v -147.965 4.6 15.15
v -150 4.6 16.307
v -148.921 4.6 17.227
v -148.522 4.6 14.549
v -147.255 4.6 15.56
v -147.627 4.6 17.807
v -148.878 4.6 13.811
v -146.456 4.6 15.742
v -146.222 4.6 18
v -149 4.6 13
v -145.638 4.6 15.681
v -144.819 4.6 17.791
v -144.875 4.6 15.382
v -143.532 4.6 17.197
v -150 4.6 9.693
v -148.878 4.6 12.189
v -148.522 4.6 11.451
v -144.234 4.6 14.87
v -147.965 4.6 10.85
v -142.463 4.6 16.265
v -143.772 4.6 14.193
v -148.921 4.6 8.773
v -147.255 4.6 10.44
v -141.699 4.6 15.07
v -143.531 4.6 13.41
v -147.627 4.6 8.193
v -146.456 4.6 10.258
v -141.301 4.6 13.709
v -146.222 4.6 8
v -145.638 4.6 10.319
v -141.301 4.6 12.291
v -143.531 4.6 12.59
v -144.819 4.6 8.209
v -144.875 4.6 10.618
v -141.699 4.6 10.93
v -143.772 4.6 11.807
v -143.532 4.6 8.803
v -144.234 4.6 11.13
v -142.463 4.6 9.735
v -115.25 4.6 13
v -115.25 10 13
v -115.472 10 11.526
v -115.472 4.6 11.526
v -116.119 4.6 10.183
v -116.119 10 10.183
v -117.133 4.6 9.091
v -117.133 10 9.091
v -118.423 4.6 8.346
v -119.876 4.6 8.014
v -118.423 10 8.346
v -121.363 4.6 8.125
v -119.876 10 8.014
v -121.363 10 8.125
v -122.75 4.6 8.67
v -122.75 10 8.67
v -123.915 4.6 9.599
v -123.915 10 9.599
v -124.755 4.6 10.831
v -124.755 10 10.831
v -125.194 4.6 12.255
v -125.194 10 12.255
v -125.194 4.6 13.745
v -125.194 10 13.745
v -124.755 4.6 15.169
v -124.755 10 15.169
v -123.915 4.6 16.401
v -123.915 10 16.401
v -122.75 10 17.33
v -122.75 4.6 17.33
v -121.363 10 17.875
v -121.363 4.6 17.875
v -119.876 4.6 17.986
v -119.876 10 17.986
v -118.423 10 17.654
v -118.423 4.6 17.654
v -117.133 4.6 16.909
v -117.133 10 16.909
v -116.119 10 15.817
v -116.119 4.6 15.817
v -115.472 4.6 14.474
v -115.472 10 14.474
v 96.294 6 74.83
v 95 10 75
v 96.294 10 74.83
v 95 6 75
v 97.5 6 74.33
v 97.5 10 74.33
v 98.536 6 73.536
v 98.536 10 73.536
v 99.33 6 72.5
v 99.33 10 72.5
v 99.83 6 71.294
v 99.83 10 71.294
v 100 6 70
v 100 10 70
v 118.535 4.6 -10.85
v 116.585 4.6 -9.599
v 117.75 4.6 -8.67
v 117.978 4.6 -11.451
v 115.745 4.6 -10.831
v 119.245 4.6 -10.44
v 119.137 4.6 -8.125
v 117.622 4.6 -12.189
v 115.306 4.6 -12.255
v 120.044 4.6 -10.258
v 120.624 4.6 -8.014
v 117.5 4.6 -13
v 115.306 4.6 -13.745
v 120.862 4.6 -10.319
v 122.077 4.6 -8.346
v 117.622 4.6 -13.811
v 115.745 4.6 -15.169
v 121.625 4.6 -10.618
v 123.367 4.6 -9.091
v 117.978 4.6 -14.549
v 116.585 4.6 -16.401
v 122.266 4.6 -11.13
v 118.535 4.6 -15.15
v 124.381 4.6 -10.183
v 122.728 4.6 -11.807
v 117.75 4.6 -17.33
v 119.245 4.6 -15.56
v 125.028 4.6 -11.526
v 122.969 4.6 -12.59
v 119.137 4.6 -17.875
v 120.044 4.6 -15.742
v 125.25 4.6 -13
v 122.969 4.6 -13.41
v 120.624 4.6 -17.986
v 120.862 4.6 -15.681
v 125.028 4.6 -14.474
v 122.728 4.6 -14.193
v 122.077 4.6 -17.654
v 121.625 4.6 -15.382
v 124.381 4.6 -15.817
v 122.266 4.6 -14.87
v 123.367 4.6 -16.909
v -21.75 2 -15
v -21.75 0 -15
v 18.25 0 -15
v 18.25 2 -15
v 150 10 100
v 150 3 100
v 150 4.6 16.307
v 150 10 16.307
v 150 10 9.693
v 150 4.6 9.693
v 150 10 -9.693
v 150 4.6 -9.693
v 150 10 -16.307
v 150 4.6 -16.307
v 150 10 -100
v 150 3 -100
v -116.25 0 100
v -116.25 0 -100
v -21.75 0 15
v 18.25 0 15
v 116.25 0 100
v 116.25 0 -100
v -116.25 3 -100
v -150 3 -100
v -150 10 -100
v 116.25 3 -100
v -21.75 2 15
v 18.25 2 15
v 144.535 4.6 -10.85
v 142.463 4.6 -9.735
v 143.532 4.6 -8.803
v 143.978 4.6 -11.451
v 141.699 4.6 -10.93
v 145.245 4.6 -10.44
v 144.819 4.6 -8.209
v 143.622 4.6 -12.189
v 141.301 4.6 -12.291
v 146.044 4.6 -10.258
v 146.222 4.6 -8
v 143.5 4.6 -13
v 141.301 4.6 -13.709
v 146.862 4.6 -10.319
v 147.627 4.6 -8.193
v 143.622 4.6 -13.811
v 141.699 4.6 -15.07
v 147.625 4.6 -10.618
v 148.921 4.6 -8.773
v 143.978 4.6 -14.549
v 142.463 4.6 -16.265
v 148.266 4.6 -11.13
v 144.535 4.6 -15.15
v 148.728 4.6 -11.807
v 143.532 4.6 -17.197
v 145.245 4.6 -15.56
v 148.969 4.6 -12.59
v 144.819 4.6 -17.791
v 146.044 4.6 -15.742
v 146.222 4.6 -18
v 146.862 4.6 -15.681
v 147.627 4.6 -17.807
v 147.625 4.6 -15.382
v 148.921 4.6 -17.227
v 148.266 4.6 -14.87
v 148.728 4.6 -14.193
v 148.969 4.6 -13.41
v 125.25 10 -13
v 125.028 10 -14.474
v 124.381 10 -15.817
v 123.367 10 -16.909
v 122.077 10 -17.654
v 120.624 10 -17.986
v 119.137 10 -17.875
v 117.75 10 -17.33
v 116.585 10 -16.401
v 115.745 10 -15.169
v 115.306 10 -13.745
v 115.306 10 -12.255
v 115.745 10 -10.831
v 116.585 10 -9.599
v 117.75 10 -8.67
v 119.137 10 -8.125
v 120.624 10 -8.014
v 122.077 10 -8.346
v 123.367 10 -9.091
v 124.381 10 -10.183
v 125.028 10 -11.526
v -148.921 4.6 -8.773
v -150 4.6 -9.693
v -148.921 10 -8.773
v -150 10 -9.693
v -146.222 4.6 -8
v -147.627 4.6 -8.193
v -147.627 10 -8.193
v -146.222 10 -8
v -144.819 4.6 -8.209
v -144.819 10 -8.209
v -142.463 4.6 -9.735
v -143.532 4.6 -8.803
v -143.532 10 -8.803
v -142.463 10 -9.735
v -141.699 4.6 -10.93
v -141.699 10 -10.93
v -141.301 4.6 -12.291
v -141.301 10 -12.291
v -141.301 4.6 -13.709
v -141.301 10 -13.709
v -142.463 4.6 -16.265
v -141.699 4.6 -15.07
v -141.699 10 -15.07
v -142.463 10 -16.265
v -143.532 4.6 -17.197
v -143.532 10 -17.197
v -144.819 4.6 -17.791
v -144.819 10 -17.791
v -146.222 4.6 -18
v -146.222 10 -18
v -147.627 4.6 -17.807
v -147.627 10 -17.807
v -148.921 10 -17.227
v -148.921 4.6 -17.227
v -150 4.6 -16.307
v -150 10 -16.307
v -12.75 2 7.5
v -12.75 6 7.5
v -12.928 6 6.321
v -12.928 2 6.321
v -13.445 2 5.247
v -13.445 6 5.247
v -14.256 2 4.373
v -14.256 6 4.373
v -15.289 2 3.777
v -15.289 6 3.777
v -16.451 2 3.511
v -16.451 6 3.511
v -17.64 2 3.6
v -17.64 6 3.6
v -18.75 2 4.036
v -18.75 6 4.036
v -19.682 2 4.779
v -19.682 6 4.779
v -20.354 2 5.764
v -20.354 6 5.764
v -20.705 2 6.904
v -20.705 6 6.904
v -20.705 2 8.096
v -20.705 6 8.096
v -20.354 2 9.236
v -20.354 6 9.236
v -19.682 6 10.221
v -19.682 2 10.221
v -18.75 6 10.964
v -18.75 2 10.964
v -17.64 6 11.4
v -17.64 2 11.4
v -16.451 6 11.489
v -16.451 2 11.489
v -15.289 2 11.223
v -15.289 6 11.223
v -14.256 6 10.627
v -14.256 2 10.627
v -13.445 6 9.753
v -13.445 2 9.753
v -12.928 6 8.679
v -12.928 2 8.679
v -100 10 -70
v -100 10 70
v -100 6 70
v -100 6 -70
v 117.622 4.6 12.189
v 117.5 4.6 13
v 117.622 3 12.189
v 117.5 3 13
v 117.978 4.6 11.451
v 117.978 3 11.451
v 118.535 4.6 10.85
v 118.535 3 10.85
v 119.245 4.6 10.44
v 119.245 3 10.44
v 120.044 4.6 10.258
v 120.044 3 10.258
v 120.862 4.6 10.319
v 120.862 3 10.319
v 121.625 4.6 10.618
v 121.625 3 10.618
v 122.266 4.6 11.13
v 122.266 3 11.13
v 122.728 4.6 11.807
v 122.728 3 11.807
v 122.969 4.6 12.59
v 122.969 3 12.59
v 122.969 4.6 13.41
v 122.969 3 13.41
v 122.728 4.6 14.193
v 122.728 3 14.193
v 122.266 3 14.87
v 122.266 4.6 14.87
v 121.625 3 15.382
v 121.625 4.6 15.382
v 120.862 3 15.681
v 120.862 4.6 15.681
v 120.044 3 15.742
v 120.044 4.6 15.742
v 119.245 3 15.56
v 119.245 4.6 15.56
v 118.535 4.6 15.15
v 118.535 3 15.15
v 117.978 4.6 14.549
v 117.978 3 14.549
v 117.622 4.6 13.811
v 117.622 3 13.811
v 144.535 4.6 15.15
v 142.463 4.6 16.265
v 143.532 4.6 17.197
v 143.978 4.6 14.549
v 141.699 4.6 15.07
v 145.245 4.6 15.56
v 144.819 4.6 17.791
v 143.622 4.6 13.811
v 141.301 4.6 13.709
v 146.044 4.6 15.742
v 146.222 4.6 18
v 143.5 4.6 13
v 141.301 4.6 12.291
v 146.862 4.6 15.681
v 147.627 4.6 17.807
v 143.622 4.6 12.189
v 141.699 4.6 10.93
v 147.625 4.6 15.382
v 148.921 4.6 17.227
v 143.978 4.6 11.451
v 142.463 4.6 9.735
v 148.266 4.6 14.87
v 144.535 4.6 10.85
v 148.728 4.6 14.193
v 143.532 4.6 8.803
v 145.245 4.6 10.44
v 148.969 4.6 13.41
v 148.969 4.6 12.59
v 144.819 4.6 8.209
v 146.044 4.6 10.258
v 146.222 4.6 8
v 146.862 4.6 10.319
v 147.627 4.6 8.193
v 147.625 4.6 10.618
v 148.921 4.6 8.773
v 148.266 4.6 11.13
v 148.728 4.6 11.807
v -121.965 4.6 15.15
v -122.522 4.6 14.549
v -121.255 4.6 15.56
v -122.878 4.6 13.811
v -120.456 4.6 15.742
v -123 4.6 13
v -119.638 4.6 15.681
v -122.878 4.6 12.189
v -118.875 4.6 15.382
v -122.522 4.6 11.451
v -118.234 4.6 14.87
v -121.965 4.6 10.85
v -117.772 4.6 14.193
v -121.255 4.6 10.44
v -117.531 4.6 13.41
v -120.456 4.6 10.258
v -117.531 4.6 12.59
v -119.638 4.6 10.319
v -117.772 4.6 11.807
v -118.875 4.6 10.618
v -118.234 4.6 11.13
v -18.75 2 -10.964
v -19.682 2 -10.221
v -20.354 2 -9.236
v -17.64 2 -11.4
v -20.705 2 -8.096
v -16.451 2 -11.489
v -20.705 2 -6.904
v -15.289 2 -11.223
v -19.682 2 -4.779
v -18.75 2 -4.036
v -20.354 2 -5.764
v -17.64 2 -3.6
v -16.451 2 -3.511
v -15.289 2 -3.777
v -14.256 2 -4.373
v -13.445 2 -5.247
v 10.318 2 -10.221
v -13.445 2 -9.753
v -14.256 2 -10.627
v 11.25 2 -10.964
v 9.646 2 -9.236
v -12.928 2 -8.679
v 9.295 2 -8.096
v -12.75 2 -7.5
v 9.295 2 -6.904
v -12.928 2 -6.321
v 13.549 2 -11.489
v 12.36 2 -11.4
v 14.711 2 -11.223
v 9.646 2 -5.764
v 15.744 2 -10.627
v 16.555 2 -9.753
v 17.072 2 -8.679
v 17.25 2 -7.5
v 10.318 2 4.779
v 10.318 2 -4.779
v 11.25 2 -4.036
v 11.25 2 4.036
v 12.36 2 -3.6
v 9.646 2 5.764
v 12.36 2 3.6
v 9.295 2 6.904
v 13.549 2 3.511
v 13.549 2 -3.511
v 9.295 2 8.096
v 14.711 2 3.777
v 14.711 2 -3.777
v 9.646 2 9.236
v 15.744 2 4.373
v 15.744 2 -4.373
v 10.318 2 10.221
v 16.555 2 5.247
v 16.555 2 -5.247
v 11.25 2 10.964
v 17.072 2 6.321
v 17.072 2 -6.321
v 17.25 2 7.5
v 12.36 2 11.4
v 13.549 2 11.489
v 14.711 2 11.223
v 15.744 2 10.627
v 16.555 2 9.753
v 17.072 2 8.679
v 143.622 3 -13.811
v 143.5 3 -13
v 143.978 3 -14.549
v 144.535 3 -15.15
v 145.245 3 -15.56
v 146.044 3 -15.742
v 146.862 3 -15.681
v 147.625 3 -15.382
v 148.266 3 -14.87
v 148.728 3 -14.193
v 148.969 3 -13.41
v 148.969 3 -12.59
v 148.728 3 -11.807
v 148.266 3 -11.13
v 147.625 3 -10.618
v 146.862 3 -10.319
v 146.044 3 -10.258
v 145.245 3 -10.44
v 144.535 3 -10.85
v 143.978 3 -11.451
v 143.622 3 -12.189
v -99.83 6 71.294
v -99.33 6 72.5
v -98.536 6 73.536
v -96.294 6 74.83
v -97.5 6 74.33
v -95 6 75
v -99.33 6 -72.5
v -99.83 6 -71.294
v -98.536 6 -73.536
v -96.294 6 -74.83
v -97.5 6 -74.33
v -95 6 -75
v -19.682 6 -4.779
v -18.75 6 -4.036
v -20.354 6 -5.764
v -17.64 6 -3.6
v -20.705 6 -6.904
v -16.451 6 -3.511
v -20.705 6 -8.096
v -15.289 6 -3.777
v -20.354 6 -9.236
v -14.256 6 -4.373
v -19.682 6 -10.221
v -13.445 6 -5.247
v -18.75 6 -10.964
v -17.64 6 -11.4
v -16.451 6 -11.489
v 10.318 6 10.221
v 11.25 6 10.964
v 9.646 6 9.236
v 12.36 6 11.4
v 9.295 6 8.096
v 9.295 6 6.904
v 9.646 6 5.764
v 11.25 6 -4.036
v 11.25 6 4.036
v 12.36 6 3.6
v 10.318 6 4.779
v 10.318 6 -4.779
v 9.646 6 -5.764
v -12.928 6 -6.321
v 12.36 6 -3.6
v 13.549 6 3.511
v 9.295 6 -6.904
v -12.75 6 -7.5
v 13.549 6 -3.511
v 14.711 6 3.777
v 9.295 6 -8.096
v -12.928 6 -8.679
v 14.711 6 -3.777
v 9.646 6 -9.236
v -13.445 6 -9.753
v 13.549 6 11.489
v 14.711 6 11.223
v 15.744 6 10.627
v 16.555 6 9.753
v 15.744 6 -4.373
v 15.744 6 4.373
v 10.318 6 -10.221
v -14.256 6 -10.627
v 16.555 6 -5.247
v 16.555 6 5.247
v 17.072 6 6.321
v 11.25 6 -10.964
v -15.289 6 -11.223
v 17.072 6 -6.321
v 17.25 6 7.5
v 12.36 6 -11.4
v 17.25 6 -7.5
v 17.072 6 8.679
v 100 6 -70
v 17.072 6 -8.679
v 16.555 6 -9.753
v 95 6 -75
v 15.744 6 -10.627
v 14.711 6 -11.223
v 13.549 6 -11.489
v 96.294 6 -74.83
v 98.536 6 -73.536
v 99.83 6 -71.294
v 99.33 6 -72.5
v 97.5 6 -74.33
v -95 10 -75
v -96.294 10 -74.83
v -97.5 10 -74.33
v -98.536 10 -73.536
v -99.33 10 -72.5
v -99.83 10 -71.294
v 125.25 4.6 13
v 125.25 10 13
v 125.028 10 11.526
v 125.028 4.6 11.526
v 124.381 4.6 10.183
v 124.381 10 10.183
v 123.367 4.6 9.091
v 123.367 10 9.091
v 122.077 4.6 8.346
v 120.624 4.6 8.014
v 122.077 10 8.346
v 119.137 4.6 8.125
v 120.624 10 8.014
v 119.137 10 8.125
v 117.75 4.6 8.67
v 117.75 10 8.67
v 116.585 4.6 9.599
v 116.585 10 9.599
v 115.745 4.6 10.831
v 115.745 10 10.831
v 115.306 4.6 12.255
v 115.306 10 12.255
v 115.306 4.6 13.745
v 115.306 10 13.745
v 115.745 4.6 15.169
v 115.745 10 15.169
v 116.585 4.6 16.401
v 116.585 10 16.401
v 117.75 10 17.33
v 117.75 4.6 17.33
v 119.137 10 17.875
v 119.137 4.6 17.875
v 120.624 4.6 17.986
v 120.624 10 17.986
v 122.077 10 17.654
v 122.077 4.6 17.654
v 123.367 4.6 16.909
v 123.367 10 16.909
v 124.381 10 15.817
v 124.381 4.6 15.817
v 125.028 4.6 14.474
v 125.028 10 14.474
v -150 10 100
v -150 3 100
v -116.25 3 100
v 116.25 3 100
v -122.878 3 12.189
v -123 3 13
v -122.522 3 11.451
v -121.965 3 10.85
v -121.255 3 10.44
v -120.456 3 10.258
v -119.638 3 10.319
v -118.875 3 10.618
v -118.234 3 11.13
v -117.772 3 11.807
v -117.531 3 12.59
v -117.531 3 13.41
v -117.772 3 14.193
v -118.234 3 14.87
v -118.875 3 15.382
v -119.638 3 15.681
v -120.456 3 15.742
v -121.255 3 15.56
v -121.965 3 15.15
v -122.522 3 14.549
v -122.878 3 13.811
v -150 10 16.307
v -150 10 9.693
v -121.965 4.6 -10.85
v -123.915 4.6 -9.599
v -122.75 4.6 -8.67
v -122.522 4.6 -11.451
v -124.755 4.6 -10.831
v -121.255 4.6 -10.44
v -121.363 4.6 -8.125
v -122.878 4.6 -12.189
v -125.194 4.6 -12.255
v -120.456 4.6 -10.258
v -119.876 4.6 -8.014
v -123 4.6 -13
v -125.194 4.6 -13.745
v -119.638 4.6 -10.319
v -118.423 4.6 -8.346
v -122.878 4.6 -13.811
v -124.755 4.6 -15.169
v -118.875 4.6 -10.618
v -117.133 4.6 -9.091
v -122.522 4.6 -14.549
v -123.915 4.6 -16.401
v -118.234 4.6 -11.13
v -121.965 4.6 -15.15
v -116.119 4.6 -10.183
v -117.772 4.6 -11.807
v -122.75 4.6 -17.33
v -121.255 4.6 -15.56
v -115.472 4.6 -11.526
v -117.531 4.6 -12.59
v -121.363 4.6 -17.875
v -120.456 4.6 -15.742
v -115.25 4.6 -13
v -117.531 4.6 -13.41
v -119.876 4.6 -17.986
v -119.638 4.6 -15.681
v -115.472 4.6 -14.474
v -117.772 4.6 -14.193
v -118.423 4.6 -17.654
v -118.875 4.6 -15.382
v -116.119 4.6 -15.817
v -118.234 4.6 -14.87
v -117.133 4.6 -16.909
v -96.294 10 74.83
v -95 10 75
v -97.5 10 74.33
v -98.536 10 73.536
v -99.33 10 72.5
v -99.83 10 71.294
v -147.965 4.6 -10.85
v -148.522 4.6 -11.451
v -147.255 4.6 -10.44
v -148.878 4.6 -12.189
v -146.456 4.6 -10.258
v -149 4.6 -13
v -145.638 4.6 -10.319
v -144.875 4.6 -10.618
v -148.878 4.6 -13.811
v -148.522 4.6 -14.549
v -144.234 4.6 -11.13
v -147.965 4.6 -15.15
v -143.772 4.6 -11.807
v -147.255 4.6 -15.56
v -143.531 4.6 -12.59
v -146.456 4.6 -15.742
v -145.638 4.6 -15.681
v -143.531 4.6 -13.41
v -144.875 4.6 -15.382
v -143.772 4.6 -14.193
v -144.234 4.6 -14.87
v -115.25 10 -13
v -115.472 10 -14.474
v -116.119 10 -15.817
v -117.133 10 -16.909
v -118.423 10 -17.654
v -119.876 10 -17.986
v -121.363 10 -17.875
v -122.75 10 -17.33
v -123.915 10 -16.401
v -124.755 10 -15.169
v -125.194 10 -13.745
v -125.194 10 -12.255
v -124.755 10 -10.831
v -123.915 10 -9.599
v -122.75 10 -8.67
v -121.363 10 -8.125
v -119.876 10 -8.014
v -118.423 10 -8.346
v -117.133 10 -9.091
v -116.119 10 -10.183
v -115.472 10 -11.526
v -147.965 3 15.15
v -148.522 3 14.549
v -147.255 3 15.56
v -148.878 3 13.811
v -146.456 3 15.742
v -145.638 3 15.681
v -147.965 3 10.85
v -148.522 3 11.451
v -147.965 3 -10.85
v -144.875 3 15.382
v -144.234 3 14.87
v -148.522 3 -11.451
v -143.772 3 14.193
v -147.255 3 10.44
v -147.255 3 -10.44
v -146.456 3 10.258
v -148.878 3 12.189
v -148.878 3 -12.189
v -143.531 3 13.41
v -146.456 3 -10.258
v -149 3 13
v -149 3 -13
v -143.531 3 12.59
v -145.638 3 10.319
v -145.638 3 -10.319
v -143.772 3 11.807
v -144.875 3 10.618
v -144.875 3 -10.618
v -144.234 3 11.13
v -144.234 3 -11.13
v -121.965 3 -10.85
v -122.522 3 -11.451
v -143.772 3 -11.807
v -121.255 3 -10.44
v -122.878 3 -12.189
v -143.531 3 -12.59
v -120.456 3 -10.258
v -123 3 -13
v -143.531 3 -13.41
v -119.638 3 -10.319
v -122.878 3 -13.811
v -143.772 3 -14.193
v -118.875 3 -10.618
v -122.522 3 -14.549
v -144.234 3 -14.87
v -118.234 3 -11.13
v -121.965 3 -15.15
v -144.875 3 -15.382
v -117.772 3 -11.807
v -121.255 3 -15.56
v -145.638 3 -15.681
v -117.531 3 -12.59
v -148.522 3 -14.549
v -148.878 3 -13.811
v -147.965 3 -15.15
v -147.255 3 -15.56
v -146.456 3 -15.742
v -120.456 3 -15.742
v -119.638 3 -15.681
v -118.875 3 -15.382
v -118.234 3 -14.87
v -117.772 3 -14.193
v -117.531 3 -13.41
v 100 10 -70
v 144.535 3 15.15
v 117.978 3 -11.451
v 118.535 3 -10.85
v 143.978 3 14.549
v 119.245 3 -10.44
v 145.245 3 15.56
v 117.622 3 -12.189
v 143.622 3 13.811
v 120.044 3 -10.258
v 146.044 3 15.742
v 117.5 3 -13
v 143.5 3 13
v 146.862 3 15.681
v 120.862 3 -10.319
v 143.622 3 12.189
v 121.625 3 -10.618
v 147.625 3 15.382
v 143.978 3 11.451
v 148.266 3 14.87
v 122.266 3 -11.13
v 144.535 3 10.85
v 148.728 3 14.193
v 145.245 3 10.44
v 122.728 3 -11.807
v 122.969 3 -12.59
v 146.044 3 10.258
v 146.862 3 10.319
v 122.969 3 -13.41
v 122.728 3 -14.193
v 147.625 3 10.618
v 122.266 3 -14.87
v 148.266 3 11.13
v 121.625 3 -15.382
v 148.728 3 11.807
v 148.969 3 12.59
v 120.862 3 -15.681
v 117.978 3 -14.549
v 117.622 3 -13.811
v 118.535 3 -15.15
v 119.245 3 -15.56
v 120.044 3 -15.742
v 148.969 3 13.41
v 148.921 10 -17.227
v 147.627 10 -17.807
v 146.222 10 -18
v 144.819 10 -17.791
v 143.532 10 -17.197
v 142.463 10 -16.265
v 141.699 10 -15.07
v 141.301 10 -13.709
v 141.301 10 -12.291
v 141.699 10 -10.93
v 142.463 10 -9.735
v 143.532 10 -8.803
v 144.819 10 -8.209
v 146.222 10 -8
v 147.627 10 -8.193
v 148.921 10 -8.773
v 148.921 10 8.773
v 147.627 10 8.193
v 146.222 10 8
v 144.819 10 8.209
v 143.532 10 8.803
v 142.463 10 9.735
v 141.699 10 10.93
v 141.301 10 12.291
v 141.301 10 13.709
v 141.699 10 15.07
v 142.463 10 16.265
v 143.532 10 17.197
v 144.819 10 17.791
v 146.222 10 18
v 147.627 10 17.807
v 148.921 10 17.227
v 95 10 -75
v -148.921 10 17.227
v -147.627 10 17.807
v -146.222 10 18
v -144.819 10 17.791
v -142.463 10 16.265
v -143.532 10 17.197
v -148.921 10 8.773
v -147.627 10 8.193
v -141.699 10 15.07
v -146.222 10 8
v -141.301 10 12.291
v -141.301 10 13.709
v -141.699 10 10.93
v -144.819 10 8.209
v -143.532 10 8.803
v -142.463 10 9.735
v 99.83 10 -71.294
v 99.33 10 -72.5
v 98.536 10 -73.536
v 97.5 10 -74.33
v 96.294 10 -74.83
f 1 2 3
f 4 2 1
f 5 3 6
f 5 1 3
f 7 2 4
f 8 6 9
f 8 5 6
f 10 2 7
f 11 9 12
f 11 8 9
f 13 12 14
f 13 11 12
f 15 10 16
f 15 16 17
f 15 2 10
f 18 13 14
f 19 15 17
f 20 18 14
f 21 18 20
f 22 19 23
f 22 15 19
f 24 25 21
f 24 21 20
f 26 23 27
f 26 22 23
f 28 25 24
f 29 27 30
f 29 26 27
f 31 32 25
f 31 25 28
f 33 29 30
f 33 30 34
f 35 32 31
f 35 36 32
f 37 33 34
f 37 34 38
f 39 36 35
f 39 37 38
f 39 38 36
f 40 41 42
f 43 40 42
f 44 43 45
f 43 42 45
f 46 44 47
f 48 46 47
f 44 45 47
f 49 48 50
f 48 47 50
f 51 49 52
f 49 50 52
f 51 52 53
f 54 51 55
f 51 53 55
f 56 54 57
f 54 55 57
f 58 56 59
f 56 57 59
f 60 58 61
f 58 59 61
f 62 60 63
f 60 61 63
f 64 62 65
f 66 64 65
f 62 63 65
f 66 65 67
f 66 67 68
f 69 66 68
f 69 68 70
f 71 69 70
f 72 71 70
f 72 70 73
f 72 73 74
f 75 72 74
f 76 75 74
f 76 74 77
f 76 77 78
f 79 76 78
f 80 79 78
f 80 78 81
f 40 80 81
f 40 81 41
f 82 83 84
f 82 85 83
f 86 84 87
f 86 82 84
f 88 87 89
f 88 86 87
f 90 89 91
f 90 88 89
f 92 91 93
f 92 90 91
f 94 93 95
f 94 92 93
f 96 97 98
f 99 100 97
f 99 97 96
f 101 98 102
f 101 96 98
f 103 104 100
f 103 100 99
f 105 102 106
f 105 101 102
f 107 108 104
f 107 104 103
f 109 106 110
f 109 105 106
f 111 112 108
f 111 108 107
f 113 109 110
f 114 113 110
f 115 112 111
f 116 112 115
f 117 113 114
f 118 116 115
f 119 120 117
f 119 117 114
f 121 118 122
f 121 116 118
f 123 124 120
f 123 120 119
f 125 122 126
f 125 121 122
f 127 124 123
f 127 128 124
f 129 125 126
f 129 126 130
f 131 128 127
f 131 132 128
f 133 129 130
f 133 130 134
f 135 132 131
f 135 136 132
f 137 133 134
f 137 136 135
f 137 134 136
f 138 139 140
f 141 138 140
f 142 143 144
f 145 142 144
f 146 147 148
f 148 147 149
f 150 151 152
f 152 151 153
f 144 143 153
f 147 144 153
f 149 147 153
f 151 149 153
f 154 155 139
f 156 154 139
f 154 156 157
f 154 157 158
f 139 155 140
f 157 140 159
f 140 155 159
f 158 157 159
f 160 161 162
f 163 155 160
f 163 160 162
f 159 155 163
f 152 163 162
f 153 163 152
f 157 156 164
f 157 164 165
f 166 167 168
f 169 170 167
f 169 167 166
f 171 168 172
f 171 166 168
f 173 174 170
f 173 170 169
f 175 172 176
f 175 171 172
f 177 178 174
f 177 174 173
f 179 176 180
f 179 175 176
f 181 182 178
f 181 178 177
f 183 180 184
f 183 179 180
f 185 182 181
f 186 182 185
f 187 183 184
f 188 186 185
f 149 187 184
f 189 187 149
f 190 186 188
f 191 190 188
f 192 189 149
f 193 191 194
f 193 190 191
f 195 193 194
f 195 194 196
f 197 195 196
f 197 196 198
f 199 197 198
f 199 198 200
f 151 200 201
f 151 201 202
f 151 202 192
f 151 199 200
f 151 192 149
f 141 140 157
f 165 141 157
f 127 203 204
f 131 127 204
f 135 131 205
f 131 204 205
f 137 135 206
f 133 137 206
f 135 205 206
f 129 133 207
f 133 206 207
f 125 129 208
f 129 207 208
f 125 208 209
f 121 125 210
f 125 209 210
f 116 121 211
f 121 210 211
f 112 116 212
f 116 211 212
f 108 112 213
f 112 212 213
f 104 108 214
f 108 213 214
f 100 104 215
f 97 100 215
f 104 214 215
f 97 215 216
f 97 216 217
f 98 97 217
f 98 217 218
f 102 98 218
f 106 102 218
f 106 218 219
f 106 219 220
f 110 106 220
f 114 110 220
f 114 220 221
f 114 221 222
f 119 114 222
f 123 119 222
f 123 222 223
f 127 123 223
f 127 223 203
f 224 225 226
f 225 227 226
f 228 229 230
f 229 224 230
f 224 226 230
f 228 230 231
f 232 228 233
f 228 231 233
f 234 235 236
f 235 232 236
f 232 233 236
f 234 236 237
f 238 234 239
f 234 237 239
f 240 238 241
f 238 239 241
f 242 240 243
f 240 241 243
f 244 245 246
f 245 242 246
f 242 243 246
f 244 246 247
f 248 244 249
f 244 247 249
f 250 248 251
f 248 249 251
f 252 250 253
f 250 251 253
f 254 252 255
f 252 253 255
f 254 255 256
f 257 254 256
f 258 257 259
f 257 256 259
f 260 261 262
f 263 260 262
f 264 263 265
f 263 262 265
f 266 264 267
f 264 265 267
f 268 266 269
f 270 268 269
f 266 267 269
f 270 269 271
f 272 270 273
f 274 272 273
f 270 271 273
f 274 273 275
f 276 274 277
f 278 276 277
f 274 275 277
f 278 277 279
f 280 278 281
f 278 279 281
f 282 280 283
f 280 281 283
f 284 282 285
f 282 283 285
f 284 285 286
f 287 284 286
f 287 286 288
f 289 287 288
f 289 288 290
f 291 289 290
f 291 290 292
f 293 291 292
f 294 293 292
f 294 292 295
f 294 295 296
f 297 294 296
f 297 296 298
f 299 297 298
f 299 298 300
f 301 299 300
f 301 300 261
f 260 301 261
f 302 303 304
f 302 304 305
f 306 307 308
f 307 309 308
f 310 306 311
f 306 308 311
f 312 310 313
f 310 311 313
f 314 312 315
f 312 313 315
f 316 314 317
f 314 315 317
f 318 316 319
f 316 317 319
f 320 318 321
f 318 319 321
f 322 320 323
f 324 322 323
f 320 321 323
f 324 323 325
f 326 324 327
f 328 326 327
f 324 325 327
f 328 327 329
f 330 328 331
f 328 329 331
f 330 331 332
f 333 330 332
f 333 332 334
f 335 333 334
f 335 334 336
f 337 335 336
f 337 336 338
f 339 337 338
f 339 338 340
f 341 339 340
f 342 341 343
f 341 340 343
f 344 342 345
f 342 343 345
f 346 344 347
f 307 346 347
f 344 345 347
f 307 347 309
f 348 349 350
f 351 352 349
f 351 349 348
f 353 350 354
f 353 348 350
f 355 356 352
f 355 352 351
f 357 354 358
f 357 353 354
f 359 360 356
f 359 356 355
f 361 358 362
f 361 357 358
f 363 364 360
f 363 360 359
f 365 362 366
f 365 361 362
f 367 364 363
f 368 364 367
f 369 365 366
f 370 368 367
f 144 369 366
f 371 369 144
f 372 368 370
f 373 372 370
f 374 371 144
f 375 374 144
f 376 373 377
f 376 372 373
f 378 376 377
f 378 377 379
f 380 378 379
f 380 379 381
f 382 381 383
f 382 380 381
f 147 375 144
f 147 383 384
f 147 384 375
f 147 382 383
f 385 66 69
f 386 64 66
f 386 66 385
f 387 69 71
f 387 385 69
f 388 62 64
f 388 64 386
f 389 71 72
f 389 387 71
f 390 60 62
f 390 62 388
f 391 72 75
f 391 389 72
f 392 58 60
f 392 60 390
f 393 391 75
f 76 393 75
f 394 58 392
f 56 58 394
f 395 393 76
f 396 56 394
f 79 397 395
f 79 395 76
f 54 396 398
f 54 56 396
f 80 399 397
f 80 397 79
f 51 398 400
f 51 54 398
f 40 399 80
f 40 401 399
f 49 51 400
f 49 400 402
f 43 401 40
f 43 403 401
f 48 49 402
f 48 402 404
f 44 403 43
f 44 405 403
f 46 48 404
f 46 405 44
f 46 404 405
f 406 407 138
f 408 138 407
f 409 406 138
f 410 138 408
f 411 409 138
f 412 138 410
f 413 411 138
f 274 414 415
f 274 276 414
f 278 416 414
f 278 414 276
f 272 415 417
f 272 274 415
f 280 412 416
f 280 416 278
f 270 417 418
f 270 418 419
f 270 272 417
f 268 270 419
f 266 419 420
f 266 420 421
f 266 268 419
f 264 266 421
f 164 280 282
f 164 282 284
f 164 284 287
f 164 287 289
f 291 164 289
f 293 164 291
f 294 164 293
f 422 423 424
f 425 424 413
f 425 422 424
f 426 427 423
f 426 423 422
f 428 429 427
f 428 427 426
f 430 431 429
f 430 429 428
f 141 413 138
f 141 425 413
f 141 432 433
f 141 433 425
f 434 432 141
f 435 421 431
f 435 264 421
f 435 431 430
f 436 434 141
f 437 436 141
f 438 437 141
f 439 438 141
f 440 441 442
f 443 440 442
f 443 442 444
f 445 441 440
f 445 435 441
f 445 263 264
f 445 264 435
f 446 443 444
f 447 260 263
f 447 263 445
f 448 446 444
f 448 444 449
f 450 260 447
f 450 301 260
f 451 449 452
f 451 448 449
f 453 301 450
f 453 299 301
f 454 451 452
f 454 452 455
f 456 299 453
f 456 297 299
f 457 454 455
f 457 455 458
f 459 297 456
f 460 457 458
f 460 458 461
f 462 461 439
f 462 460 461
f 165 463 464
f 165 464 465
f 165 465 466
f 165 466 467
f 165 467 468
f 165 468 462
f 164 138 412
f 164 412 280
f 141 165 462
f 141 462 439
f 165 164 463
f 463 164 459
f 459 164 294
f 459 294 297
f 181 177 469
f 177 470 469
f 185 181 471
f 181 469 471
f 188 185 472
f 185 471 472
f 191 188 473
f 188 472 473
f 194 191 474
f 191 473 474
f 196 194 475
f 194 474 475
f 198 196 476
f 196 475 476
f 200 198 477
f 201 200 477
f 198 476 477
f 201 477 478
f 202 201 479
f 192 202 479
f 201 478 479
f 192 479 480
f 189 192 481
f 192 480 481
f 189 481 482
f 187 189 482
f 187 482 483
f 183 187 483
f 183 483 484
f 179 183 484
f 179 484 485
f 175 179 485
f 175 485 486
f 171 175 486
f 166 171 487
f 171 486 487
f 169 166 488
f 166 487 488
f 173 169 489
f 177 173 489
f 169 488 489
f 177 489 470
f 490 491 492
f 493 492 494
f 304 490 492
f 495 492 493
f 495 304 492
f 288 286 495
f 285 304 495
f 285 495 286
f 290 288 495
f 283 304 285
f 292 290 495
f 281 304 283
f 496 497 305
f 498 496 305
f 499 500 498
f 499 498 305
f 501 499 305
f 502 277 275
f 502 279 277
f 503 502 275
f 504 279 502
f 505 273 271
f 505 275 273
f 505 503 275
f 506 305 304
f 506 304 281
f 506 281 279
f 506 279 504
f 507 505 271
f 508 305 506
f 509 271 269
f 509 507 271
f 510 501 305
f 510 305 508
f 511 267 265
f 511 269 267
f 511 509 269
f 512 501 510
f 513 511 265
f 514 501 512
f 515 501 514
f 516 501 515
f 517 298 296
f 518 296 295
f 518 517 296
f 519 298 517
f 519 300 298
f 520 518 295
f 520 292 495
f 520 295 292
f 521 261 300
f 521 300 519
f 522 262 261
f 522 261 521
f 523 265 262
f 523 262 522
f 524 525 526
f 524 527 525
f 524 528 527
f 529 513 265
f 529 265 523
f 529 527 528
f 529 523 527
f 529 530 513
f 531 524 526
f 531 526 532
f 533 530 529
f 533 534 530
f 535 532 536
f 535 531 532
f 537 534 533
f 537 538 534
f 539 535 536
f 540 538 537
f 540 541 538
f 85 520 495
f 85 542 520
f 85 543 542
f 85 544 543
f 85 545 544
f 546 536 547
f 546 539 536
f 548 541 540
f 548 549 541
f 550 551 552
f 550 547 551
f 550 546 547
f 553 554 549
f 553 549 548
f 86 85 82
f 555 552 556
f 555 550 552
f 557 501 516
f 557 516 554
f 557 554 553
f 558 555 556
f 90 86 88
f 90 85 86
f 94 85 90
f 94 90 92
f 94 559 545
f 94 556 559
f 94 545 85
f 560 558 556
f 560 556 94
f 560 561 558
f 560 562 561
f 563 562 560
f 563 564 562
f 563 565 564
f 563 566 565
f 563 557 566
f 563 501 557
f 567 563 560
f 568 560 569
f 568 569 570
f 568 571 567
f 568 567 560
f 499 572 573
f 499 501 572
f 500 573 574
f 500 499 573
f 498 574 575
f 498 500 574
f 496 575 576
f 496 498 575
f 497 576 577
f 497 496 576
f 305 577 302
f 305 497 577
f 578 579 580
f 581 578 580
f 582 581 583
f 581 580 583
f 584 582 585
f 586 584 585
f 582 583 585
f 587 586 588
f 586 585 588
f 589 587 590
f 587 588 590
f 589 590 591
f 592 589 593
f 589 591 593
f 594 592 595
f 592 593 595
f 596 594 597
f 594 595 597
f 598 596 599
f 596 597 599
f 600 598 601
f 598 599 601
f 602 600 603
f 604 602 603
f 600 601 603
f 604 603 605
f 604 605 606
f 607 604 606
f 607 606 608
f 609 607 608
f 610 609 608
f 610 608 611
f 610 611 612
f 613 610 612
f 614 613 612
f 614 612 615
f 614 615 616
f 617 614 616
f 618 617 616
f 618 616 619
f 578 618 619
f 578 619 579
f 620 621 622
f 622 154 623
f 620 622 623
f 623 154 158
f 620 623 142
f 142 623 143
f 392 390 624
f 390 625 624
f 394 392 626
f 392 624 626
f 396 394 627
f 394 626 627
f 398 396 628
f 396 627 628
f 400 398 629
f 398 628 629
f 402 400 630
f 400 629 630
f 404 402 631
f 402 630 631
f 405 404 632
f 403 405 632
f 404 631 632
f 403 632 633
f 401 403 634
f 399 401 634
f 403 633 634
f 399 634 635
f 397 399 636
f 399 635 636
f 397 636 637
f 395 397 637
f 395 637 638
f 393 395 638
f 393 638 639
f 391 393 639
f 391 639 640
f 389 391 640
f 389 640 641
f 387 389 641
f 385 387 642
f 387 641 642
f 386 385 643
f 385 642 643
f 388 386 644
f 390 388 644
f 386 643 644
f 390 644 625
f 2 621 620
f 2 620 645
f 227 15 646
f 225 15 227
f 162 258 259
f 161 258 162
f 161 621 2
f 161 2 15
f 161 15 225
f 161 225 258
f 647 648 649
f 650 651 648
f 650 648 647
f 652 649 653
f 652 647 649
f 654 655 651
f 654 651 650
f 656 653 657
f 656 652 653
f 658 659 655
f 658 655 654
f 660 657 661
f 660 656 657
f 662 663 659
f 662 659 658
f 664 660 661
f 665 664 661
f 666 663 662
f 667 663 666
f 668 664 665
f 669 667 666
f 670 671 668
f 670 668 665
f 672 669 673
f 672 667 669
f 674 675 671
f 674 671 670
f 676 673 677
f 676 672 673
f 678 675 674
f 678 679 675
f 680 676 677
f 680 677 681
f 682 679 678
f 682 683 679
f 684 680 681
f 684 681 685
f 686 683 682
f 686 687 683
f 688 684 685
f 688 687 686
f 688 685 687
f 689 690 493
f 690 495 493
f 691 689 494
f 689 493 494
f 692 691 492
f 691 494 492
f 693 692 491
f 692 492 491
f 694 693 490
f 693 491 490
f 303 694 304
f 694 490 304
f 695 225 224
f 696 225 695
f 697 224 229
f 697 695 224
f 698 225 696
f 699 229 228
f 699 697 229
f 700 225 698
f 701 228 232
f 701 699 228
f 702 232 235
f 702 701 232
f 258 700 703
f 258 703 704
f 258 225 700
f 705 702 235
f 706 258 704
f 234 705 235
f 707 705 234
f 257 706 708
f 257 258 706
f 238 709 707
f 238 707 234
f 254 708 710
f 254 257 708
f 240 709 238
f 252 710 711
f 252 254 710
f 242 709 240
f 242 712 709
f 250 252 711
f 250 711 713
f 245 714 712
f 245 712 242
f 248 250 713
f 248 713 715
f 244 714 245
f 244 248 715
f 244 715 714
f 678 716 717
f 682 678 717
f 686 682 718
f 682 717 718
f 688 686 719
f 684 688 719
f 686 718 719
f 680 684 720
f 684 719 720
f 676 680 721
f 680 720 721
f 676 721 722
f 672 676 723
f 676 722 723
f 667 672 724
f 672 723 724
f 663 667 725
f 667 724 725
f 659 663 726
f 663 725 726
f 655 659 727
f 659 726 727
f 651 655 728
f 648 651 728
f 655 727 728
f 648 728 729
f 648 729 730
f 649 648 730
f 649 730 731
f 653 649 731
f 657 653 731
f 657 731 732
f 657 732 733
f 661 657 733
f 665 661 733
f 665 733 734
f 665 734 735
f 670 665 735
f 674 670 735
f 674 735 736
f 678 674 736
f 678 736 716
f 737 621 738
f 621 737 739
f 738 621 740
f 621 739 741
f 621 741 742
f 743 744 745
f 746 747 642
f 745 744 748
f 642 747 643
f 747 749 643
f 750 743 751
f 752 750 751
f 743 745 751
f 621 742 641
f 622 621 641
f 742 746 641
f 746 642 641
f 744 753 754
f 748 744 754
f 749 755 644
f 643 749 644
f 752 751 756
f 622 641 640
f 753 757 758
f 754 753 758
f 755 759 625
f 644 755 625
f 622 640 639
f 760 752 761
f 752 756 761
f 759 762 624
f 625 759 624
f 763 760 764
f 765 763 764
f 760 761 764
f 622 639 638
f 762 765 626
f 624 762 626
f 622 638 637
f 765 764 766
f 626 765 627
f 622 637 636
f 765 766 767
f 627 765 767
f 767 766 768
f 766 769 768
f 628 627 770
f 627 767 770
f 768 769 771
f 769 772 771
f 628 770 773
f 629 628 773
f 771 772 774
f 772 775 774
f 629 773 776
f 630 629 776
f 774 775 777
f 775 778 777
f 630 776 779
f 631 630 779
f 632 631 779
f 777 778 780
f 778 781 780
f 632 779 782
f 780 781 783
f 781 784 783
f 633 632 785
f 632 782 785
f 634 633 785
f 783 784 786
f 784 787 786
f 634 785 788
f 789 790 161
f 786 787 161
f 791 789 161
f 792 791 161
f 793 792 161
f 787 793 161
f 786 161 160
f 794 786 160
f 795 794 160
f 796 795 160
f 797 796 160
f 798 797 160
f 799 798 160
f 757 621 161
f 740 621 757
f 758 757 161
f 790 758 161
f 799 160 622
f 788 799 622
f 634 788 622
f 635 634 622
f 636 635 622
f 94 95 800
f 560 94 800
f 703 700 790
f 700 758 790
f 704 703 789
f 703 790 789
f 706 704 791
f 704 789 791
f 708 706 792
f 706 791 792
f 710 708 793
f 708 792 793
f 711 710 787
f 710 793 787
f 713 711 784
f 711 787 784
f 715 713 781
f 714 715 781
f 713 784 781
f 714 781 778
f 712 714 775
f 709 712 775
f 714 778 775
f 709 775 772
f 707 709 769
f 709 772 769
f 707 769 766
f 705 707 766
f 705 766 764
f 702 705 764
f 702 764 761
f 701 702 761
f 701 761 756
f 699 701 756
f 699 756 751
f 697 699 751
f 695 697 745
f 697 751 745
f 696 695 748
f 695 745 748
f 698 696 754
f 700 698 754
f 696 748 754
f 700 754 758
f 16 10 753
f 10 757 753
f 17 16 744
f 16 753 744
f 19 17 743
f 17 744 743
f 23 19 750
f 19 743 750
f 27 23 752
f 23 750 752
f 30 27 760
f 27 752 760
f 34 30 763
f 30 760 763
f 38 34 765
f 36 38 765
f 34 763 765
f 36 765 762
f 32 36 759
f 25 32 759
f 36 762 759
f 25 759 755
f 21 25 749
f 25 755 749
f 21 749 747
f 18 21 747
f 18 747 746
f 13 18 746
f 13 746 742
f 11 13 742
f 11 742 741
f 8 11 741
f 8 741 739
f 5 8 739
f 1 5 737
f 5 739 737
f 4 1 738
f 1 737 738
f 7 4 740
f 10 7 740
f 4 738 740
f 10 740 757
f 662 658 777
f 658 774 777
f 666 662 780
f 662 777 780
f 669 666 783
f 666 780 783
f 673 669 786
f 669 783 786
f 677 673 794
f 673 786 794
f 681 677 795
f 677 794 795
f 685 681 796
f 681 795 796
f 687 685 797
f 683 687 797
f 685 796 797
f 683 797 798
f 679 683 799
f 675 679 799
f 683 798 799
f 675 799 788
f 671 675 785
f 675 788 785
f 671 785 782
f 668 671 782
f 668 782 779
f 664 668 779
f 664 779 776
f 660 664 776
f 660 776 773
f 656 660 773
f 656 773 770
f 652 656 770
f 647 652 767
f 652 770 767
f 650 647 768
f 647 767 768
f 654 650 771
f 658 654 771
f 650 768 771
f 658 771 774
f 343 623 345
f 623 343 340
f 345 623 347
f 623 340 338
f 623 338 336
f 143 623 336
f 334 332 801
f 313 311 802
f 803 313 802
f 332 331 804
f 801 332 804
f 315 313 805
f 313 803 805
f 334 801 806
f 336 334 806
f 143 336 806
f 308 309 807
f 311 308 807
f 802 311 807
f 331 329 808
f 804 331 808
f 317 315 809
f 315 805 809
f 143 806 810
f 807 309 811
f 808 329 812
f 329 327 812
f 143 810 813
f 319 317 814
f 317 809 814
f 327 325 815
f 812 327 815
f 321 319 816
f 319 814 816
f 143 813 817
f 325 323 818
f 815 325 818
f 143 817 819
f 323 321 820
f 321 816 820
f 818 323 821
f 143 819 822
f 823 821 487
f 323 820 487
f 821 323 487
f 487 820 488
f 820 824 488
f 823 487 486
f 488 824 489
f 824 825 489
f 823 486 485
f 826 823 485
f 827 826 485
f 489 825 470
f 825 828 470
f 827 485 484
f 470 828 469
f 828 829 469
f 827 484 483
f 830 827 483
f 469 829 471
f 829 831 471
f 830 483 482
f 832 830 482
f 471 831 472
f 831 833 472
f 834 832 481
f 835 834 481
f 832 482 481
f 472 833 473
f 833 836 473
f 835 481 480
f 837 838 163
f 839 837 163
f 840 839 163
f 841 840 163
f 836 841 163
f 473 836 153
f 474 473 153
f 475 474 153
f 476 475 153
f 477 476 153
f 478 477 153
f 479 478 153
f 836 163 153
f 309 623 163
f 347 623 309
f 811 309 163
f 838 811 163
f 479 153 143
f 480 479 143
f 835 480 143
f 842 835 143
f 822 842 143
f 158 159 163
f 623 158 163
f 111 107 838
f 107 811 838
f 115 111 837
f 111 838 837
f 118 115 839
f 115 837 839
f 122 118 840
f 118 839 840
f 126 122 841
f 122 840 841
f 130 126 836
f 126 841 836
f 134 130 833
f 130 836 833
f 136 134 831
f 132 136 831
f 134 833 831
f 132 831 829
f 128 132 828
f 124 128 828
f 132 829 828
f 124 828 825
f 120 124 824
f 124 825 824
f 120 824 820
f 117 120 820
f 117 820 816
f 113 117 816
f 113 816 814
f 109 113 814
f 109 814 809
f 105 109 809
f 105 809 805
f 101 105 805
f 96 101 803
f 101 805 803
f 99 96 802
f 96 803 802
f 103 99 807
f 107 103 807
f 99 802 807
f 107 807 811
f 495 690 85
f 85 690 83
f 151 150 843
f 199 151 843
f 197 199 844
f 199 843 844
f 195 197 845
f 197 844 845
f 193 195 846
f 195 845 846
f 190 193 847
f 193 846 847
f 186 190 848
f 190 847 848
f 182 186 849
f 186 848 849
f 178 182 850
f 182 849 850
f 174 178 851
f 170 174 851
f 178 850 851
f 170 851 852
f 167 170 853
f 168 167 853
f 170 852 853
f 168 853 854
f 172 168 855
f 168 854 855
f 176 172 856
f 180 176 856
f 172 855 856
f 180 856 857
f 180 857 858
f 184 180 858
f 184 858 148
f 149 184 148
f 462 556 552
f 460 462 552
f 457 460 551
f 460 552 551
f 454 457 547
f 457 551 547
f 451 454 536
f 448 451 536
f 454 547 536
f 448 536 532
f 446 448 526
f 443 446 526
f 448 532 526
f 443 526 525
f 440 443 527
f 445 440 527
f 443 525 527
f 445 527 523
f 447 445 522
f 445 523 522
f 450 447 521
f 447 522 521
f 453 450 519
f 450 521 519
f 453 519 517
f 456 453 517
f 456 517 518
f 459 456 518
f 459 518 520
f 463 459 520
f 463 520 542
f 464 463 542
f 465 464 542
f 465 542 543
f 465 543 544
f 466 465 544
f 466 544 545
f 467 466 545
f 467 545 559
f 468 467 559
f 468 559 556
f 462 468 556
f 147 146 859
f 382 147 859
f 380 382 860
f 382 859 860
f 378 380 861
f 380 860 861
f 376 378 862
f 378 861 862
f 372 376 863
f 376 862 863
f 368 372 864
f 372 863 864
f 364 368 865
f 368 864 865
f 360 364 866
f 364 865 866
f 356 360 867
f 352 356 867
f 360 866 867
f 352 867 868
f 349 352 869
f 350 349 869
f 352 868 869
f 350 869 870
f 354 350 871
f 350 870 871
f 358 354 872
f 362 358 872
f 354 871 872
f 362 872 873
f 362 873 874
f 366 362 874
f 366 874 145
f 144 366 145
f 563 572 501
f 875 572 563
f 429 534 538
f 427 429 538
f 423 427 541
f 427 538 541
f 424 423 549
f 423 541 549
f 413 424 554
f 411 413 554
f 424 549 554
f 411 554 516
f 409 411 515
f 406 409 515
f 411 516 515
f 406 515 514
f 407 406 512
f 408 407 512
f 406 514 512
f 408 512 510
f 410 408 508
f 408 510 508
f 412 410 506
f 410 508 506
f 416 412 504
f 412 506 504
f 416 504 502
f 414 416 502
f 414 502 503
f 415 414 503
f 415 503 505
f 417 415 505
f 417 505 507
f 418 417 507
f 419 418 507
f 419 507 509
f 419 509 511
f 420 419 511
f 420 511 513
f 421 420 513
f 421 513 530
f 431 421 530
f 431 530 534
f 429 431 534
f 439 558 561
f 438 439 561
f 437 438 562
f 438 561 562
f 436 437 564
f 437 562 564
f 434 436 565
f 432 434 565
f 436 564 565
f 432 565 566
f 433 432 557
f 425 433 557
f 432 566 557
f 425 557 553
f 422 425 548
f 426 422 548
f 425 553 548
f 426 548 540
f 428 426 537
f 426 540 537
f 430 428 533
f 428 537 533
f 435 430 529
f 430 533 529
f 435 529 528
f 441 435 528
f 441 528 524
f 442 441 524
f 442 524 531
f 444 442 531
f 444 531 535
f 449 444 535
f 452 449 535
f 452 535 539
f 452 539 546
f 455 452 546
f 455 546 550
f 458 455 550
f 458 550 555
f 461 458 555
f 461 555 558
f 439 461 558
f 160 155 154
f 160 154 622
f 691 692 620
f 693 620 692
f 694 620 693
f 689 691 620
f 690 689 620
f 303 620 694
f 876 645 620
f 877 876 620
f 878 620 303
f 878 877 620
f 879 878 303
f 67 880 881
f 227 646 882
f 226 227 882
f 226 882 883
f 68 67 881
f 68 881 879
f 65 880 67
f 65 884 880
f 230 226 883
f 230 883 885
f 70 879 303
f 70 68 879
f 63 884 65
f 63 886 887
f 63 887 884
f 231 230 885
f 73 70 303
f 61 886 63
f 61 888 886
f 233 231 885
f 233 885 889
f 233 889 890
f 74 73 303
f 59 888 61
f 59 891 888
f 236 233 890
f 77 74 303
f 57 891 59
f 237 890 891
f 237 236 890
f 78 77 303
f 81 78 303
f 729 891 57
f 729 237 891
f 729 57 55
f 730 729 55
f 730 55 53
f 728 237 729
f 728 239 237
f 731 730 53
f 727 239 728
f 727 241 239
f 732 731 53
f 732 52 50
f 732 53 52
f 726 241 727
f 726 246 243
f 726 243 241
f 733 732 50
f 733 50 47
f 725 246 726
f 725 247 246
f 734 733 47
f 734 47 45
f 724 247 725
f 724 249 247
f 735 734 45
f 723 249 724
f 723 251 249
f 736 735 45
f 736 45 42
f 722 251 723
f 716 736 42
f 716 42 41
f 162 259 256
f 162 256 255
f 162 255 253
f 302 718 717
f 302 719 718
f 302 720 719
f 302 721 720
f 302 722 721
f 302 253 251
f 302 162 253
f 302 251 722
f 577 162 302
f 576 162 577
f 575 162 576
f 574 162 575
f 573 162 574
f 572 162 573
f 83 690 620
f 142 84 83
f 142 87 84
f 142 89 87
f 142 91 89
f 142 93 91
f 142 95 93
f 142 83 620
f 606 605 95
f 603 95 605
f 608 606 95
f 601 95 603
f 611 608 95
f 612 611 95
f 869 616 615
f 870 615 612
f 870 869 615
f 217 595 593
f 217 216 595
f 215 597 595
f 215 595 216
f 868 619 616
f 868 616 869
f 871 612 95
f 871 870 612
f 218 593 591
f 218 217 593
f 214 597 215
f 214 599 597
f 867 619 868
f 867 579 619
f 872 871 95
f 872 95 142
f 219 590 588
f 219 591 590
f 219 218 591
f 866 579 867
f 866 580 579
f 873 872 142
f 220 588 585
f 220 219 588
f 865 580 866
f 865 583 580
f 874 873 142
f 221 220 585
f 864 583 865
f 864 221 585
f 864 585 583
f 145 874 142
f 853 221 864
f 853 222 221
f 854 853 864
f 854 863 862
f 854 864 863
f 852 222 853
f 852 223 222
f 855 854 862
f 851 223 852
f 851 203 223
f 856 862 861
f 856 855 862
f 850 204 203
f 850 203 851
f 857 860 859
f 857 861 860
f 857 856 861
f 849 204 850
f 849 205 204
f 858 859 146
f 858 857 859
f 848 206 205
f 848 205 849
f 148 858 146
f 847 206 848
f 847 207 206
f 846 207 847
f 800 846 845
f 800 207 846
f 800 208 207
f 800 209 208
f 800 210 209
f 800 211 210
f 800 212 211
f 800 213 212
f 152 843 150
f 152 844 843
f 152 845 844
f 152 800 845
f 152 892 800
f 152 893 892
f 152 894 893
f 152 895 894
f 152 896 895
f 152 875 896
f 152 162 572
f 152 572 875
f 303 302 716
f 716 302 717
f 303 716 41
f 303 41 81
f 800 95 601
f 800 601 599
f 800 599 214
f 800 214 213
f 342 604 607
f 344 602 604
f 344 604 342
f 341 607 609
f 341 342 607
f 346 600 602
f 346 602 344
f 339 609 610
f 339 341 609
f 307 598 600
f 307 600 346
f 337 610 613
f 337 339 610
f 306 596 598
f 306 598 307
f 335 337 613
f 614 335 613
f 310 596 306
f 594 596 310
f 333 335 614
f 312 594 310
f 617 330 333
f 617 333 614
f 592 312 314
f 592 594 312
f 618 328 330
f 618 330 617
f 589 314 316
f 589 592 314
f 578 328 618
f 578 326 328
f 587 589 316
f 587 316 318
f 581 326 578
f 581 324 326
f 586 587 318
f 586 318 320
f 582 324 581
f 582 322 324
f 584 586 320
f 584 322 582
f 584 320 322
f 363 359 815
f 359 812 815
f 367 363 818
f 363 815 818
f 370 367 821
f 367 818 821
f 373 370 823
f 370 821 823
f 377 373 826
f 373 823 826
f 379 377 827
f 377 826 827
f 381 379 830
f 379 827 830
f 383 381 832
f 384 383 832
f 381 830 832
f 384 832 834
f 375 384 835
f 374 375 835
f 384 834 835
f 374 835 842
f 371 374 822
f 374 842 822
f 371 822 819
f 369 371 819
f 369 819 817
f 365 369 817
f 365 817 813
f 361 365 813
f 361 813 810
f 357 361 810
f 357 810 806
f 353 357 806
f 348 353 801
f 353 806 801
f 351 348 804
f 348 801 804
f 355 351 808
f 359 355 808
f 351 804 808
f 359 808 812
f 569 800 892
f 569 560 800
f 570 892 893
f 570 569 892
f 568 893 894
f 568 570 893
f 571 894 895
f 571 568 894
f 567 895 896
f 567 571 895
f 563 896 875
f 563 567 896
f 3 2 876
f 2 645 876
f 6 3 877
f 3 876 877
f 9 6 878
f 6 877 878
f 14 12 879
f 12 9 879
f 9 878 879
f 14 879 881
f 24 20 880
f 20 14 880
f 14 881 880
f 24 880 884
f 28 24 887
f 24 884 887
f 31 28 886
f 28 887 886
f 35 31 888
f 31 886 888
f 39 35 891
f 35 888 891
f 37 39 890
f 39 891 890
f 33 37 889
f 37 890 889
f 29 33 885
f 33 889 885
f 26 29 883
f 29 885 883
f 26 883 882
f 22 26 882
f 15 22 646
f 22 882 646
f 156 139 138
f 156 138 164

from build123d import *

# Parameters (mm, degrees)
SKETCH1_W                                           = 300
SKETCH1_H                                           = 200
BOSS_EXTRUDE1_DEPTH                                 = 10
CUT_EXTRUDE1_DEPTH                                  = 251.199920064
CUT_EXTRUDE1_DEPTH_BACK                             = 251.199920064
SKETCH2_W                                           = 33.75
SKETCH2_H                                           = 3
SKETCH3_W                                           = 200
SKETCH3_H                                           = 150
CUT_EXTRUDE2_DEPTH                                  = 4
FILLET1_R                                           = 5
CBORE_FOR_M5_HEX_SOCKET_HEAD_CAP_SCREW1_D           = 5.5
CBORE_FOR_M5_HEX_SOCKET_HEAD_CAP_SCREW1_CBORE_D     = 10
CBORE_FOR_M5_HEX_SOCKET_HEAD_CAP_SCREW1_CBORE_DEPTH = 5.4
SKETCH6_W                                           = 40
SKETCH6_H                                           = 30
CUT_EXTRUDE3_DEPTH                                  = 2
CBORE_FOR_M4_HEX_SOCKET_HEAD_CAP_SCREW1_D           = 4.5
CBORE_FOR_M4_HEX_SOCKET_HEAD_CAP_SCREW1_DEPTH       = 11.5
CBORE_FOR_M4_HEX_SOCKET_HEAD_CAP_SCREW1_CBORE_D     = 8
CBORE_FOR_M4_HEX_SOCKET_HEAD_CAP_SCREW1_CBORE_DEPTH = 4.4
CBORE_FOR_M4_HEX_SOCKET_HEAD_CAP_SCREW1_TIP         = 1.351936393


with BuildPart() as part:
    # Sketch1 → Boss-Extrude1 (new body)
    with BuildSketch(Plane(origin=(0, 0, 0), x_dir=(1, 0, 0), z_dir=(0, 1, 0))):
        Rectangle(SKETCH1_W, SKETCH1_H)
    extrude(amount=BOSS_EXTRUDE1_DEPTH)

    # Sketch2 → Cut-Extrude1 (cut, two sides: drawn at the far end of the back side and taken through both)
    with BuildSketch(Plane.XY.offset(100).offset(-CUT_EXTRUDE1_DEPTH_BACK)):
        with Locations((-133.125, 1.5)):
            Rectangle(SKETCH2_W, SKETCH2_H)
        with Locations((133.125, 1.5)):
            Rectangle(SKETCH2_W, SKETCH2_H)
    extrude(amount=CUT_EXTRUDE1_DEPTH + CUT_EXTRUDE1_DEPTH_BACK, mode=Mode.SUBTRACT)

    # Sketch3 → Cut-Extrude2 (cut)
    with BuildSketch(Plane(origin=(0, 10, 0), x_dir=(1, 0, 0), z_dir=(0, 1, 0))):
        Rectangle(SKETCH3_W, SKETCH3_H)
    extrude(amount=-CUT_EXTRUDE2_DEPTH, mode=Mode.SUBTRACT)

    # Fillet1
    fillet1_edges = [part.edges().sort_by_distance(p)[0] for p in [
        (-100, 8, 75),
        (-100, 8, -75),
        (100, 8, -75),
        (100, 8, 75),
    ]]
    fillet(fillet1_edges, radius=FILLET1_R)

    # CBORE for M5 Hex Socket Head Cap Screw1 (through all)
    with Locations(Plane(origin=(0, 10, 0), x_dir=(1, 0, 0), z_dir=(0, 1, 0))):
        with Locations((146.25, 13), (120.25, 13), (120.25, -13), (146.25, -13), (-146.25, 13), (-120.25, 13), (-146.25, -13), (-120.25, -13)):
            CounterBoreHole(CBORE_FOR_M5_HEX_SOCKET_HEAD_CAP_SCREW1_D / 2, CBORE_FOR_M5_HEX_SOCKET_HEAD_CAP_SCREW1_CBORE_D / 2, CBORE_FOR_M5_HEX_SOCKET_HEAD_CAP_SCREW1_CBORE_DEPTH)

    # Sketch6 → Cut-Extrude3 (cut)
    with BuildSketch(Plane.XZ):
        with Locations((-1.749998631, 0)):
            Rectangle(SKETCH6_W, SKETCH6_H)
    extrude(amount=-CUT_EXTRUDE3_DEPTH, mode=Mode.SUBTRACT)

    # CBORE for M4 Hex Socket Head Cap Screw1
    with Locations(Plane(origin=(0, 6, 0), x_dir=(1, 0, 0), z_dir=(0, 1, 0))):
        with Locations((13.249979912, 7.5), (13.249979912, -7.5), (-16.750020088, 7.5), (-16.750020088, -7.5)):
            CounterBoreHole(CBORE_FOR_M4_HEX_SOCKET_HEAD_CAP_SCREW1_D / 2, CBORE_FOR_M4_HEX_SOCKET_HEAD_CAP_SCREW1_CBORE_D / 2, CBORE_FOR_M4_HEX_SOCKET_HEAD_CAP_SCREW1_CBORE_DEPTH, depth=CBORE_FOR_M4_HEX_SOCKET_HEAD_CAP_SCREW1_DEPTH)
            with Locations((0, 0, -(CBORE_FOR_M4_HEX_SOCKET_HEAD_CAP_SCREW1_DEPTH + CBORE_FOR_M4_HEX_SOCKET_HEAD_CAP_SCREW1_TIP / 2))):  # 118° drill point
                Cone(0, CBORE_FOR_M4_HEX_SOCKET_HEAD_CAP_SCREW1_D / 2, CBORE_FOR_M4_HEX_SOCKET_HEAD_CAP_SCREW1_TIP, mode=Mode.SUBTRACT)


solid = part.part
